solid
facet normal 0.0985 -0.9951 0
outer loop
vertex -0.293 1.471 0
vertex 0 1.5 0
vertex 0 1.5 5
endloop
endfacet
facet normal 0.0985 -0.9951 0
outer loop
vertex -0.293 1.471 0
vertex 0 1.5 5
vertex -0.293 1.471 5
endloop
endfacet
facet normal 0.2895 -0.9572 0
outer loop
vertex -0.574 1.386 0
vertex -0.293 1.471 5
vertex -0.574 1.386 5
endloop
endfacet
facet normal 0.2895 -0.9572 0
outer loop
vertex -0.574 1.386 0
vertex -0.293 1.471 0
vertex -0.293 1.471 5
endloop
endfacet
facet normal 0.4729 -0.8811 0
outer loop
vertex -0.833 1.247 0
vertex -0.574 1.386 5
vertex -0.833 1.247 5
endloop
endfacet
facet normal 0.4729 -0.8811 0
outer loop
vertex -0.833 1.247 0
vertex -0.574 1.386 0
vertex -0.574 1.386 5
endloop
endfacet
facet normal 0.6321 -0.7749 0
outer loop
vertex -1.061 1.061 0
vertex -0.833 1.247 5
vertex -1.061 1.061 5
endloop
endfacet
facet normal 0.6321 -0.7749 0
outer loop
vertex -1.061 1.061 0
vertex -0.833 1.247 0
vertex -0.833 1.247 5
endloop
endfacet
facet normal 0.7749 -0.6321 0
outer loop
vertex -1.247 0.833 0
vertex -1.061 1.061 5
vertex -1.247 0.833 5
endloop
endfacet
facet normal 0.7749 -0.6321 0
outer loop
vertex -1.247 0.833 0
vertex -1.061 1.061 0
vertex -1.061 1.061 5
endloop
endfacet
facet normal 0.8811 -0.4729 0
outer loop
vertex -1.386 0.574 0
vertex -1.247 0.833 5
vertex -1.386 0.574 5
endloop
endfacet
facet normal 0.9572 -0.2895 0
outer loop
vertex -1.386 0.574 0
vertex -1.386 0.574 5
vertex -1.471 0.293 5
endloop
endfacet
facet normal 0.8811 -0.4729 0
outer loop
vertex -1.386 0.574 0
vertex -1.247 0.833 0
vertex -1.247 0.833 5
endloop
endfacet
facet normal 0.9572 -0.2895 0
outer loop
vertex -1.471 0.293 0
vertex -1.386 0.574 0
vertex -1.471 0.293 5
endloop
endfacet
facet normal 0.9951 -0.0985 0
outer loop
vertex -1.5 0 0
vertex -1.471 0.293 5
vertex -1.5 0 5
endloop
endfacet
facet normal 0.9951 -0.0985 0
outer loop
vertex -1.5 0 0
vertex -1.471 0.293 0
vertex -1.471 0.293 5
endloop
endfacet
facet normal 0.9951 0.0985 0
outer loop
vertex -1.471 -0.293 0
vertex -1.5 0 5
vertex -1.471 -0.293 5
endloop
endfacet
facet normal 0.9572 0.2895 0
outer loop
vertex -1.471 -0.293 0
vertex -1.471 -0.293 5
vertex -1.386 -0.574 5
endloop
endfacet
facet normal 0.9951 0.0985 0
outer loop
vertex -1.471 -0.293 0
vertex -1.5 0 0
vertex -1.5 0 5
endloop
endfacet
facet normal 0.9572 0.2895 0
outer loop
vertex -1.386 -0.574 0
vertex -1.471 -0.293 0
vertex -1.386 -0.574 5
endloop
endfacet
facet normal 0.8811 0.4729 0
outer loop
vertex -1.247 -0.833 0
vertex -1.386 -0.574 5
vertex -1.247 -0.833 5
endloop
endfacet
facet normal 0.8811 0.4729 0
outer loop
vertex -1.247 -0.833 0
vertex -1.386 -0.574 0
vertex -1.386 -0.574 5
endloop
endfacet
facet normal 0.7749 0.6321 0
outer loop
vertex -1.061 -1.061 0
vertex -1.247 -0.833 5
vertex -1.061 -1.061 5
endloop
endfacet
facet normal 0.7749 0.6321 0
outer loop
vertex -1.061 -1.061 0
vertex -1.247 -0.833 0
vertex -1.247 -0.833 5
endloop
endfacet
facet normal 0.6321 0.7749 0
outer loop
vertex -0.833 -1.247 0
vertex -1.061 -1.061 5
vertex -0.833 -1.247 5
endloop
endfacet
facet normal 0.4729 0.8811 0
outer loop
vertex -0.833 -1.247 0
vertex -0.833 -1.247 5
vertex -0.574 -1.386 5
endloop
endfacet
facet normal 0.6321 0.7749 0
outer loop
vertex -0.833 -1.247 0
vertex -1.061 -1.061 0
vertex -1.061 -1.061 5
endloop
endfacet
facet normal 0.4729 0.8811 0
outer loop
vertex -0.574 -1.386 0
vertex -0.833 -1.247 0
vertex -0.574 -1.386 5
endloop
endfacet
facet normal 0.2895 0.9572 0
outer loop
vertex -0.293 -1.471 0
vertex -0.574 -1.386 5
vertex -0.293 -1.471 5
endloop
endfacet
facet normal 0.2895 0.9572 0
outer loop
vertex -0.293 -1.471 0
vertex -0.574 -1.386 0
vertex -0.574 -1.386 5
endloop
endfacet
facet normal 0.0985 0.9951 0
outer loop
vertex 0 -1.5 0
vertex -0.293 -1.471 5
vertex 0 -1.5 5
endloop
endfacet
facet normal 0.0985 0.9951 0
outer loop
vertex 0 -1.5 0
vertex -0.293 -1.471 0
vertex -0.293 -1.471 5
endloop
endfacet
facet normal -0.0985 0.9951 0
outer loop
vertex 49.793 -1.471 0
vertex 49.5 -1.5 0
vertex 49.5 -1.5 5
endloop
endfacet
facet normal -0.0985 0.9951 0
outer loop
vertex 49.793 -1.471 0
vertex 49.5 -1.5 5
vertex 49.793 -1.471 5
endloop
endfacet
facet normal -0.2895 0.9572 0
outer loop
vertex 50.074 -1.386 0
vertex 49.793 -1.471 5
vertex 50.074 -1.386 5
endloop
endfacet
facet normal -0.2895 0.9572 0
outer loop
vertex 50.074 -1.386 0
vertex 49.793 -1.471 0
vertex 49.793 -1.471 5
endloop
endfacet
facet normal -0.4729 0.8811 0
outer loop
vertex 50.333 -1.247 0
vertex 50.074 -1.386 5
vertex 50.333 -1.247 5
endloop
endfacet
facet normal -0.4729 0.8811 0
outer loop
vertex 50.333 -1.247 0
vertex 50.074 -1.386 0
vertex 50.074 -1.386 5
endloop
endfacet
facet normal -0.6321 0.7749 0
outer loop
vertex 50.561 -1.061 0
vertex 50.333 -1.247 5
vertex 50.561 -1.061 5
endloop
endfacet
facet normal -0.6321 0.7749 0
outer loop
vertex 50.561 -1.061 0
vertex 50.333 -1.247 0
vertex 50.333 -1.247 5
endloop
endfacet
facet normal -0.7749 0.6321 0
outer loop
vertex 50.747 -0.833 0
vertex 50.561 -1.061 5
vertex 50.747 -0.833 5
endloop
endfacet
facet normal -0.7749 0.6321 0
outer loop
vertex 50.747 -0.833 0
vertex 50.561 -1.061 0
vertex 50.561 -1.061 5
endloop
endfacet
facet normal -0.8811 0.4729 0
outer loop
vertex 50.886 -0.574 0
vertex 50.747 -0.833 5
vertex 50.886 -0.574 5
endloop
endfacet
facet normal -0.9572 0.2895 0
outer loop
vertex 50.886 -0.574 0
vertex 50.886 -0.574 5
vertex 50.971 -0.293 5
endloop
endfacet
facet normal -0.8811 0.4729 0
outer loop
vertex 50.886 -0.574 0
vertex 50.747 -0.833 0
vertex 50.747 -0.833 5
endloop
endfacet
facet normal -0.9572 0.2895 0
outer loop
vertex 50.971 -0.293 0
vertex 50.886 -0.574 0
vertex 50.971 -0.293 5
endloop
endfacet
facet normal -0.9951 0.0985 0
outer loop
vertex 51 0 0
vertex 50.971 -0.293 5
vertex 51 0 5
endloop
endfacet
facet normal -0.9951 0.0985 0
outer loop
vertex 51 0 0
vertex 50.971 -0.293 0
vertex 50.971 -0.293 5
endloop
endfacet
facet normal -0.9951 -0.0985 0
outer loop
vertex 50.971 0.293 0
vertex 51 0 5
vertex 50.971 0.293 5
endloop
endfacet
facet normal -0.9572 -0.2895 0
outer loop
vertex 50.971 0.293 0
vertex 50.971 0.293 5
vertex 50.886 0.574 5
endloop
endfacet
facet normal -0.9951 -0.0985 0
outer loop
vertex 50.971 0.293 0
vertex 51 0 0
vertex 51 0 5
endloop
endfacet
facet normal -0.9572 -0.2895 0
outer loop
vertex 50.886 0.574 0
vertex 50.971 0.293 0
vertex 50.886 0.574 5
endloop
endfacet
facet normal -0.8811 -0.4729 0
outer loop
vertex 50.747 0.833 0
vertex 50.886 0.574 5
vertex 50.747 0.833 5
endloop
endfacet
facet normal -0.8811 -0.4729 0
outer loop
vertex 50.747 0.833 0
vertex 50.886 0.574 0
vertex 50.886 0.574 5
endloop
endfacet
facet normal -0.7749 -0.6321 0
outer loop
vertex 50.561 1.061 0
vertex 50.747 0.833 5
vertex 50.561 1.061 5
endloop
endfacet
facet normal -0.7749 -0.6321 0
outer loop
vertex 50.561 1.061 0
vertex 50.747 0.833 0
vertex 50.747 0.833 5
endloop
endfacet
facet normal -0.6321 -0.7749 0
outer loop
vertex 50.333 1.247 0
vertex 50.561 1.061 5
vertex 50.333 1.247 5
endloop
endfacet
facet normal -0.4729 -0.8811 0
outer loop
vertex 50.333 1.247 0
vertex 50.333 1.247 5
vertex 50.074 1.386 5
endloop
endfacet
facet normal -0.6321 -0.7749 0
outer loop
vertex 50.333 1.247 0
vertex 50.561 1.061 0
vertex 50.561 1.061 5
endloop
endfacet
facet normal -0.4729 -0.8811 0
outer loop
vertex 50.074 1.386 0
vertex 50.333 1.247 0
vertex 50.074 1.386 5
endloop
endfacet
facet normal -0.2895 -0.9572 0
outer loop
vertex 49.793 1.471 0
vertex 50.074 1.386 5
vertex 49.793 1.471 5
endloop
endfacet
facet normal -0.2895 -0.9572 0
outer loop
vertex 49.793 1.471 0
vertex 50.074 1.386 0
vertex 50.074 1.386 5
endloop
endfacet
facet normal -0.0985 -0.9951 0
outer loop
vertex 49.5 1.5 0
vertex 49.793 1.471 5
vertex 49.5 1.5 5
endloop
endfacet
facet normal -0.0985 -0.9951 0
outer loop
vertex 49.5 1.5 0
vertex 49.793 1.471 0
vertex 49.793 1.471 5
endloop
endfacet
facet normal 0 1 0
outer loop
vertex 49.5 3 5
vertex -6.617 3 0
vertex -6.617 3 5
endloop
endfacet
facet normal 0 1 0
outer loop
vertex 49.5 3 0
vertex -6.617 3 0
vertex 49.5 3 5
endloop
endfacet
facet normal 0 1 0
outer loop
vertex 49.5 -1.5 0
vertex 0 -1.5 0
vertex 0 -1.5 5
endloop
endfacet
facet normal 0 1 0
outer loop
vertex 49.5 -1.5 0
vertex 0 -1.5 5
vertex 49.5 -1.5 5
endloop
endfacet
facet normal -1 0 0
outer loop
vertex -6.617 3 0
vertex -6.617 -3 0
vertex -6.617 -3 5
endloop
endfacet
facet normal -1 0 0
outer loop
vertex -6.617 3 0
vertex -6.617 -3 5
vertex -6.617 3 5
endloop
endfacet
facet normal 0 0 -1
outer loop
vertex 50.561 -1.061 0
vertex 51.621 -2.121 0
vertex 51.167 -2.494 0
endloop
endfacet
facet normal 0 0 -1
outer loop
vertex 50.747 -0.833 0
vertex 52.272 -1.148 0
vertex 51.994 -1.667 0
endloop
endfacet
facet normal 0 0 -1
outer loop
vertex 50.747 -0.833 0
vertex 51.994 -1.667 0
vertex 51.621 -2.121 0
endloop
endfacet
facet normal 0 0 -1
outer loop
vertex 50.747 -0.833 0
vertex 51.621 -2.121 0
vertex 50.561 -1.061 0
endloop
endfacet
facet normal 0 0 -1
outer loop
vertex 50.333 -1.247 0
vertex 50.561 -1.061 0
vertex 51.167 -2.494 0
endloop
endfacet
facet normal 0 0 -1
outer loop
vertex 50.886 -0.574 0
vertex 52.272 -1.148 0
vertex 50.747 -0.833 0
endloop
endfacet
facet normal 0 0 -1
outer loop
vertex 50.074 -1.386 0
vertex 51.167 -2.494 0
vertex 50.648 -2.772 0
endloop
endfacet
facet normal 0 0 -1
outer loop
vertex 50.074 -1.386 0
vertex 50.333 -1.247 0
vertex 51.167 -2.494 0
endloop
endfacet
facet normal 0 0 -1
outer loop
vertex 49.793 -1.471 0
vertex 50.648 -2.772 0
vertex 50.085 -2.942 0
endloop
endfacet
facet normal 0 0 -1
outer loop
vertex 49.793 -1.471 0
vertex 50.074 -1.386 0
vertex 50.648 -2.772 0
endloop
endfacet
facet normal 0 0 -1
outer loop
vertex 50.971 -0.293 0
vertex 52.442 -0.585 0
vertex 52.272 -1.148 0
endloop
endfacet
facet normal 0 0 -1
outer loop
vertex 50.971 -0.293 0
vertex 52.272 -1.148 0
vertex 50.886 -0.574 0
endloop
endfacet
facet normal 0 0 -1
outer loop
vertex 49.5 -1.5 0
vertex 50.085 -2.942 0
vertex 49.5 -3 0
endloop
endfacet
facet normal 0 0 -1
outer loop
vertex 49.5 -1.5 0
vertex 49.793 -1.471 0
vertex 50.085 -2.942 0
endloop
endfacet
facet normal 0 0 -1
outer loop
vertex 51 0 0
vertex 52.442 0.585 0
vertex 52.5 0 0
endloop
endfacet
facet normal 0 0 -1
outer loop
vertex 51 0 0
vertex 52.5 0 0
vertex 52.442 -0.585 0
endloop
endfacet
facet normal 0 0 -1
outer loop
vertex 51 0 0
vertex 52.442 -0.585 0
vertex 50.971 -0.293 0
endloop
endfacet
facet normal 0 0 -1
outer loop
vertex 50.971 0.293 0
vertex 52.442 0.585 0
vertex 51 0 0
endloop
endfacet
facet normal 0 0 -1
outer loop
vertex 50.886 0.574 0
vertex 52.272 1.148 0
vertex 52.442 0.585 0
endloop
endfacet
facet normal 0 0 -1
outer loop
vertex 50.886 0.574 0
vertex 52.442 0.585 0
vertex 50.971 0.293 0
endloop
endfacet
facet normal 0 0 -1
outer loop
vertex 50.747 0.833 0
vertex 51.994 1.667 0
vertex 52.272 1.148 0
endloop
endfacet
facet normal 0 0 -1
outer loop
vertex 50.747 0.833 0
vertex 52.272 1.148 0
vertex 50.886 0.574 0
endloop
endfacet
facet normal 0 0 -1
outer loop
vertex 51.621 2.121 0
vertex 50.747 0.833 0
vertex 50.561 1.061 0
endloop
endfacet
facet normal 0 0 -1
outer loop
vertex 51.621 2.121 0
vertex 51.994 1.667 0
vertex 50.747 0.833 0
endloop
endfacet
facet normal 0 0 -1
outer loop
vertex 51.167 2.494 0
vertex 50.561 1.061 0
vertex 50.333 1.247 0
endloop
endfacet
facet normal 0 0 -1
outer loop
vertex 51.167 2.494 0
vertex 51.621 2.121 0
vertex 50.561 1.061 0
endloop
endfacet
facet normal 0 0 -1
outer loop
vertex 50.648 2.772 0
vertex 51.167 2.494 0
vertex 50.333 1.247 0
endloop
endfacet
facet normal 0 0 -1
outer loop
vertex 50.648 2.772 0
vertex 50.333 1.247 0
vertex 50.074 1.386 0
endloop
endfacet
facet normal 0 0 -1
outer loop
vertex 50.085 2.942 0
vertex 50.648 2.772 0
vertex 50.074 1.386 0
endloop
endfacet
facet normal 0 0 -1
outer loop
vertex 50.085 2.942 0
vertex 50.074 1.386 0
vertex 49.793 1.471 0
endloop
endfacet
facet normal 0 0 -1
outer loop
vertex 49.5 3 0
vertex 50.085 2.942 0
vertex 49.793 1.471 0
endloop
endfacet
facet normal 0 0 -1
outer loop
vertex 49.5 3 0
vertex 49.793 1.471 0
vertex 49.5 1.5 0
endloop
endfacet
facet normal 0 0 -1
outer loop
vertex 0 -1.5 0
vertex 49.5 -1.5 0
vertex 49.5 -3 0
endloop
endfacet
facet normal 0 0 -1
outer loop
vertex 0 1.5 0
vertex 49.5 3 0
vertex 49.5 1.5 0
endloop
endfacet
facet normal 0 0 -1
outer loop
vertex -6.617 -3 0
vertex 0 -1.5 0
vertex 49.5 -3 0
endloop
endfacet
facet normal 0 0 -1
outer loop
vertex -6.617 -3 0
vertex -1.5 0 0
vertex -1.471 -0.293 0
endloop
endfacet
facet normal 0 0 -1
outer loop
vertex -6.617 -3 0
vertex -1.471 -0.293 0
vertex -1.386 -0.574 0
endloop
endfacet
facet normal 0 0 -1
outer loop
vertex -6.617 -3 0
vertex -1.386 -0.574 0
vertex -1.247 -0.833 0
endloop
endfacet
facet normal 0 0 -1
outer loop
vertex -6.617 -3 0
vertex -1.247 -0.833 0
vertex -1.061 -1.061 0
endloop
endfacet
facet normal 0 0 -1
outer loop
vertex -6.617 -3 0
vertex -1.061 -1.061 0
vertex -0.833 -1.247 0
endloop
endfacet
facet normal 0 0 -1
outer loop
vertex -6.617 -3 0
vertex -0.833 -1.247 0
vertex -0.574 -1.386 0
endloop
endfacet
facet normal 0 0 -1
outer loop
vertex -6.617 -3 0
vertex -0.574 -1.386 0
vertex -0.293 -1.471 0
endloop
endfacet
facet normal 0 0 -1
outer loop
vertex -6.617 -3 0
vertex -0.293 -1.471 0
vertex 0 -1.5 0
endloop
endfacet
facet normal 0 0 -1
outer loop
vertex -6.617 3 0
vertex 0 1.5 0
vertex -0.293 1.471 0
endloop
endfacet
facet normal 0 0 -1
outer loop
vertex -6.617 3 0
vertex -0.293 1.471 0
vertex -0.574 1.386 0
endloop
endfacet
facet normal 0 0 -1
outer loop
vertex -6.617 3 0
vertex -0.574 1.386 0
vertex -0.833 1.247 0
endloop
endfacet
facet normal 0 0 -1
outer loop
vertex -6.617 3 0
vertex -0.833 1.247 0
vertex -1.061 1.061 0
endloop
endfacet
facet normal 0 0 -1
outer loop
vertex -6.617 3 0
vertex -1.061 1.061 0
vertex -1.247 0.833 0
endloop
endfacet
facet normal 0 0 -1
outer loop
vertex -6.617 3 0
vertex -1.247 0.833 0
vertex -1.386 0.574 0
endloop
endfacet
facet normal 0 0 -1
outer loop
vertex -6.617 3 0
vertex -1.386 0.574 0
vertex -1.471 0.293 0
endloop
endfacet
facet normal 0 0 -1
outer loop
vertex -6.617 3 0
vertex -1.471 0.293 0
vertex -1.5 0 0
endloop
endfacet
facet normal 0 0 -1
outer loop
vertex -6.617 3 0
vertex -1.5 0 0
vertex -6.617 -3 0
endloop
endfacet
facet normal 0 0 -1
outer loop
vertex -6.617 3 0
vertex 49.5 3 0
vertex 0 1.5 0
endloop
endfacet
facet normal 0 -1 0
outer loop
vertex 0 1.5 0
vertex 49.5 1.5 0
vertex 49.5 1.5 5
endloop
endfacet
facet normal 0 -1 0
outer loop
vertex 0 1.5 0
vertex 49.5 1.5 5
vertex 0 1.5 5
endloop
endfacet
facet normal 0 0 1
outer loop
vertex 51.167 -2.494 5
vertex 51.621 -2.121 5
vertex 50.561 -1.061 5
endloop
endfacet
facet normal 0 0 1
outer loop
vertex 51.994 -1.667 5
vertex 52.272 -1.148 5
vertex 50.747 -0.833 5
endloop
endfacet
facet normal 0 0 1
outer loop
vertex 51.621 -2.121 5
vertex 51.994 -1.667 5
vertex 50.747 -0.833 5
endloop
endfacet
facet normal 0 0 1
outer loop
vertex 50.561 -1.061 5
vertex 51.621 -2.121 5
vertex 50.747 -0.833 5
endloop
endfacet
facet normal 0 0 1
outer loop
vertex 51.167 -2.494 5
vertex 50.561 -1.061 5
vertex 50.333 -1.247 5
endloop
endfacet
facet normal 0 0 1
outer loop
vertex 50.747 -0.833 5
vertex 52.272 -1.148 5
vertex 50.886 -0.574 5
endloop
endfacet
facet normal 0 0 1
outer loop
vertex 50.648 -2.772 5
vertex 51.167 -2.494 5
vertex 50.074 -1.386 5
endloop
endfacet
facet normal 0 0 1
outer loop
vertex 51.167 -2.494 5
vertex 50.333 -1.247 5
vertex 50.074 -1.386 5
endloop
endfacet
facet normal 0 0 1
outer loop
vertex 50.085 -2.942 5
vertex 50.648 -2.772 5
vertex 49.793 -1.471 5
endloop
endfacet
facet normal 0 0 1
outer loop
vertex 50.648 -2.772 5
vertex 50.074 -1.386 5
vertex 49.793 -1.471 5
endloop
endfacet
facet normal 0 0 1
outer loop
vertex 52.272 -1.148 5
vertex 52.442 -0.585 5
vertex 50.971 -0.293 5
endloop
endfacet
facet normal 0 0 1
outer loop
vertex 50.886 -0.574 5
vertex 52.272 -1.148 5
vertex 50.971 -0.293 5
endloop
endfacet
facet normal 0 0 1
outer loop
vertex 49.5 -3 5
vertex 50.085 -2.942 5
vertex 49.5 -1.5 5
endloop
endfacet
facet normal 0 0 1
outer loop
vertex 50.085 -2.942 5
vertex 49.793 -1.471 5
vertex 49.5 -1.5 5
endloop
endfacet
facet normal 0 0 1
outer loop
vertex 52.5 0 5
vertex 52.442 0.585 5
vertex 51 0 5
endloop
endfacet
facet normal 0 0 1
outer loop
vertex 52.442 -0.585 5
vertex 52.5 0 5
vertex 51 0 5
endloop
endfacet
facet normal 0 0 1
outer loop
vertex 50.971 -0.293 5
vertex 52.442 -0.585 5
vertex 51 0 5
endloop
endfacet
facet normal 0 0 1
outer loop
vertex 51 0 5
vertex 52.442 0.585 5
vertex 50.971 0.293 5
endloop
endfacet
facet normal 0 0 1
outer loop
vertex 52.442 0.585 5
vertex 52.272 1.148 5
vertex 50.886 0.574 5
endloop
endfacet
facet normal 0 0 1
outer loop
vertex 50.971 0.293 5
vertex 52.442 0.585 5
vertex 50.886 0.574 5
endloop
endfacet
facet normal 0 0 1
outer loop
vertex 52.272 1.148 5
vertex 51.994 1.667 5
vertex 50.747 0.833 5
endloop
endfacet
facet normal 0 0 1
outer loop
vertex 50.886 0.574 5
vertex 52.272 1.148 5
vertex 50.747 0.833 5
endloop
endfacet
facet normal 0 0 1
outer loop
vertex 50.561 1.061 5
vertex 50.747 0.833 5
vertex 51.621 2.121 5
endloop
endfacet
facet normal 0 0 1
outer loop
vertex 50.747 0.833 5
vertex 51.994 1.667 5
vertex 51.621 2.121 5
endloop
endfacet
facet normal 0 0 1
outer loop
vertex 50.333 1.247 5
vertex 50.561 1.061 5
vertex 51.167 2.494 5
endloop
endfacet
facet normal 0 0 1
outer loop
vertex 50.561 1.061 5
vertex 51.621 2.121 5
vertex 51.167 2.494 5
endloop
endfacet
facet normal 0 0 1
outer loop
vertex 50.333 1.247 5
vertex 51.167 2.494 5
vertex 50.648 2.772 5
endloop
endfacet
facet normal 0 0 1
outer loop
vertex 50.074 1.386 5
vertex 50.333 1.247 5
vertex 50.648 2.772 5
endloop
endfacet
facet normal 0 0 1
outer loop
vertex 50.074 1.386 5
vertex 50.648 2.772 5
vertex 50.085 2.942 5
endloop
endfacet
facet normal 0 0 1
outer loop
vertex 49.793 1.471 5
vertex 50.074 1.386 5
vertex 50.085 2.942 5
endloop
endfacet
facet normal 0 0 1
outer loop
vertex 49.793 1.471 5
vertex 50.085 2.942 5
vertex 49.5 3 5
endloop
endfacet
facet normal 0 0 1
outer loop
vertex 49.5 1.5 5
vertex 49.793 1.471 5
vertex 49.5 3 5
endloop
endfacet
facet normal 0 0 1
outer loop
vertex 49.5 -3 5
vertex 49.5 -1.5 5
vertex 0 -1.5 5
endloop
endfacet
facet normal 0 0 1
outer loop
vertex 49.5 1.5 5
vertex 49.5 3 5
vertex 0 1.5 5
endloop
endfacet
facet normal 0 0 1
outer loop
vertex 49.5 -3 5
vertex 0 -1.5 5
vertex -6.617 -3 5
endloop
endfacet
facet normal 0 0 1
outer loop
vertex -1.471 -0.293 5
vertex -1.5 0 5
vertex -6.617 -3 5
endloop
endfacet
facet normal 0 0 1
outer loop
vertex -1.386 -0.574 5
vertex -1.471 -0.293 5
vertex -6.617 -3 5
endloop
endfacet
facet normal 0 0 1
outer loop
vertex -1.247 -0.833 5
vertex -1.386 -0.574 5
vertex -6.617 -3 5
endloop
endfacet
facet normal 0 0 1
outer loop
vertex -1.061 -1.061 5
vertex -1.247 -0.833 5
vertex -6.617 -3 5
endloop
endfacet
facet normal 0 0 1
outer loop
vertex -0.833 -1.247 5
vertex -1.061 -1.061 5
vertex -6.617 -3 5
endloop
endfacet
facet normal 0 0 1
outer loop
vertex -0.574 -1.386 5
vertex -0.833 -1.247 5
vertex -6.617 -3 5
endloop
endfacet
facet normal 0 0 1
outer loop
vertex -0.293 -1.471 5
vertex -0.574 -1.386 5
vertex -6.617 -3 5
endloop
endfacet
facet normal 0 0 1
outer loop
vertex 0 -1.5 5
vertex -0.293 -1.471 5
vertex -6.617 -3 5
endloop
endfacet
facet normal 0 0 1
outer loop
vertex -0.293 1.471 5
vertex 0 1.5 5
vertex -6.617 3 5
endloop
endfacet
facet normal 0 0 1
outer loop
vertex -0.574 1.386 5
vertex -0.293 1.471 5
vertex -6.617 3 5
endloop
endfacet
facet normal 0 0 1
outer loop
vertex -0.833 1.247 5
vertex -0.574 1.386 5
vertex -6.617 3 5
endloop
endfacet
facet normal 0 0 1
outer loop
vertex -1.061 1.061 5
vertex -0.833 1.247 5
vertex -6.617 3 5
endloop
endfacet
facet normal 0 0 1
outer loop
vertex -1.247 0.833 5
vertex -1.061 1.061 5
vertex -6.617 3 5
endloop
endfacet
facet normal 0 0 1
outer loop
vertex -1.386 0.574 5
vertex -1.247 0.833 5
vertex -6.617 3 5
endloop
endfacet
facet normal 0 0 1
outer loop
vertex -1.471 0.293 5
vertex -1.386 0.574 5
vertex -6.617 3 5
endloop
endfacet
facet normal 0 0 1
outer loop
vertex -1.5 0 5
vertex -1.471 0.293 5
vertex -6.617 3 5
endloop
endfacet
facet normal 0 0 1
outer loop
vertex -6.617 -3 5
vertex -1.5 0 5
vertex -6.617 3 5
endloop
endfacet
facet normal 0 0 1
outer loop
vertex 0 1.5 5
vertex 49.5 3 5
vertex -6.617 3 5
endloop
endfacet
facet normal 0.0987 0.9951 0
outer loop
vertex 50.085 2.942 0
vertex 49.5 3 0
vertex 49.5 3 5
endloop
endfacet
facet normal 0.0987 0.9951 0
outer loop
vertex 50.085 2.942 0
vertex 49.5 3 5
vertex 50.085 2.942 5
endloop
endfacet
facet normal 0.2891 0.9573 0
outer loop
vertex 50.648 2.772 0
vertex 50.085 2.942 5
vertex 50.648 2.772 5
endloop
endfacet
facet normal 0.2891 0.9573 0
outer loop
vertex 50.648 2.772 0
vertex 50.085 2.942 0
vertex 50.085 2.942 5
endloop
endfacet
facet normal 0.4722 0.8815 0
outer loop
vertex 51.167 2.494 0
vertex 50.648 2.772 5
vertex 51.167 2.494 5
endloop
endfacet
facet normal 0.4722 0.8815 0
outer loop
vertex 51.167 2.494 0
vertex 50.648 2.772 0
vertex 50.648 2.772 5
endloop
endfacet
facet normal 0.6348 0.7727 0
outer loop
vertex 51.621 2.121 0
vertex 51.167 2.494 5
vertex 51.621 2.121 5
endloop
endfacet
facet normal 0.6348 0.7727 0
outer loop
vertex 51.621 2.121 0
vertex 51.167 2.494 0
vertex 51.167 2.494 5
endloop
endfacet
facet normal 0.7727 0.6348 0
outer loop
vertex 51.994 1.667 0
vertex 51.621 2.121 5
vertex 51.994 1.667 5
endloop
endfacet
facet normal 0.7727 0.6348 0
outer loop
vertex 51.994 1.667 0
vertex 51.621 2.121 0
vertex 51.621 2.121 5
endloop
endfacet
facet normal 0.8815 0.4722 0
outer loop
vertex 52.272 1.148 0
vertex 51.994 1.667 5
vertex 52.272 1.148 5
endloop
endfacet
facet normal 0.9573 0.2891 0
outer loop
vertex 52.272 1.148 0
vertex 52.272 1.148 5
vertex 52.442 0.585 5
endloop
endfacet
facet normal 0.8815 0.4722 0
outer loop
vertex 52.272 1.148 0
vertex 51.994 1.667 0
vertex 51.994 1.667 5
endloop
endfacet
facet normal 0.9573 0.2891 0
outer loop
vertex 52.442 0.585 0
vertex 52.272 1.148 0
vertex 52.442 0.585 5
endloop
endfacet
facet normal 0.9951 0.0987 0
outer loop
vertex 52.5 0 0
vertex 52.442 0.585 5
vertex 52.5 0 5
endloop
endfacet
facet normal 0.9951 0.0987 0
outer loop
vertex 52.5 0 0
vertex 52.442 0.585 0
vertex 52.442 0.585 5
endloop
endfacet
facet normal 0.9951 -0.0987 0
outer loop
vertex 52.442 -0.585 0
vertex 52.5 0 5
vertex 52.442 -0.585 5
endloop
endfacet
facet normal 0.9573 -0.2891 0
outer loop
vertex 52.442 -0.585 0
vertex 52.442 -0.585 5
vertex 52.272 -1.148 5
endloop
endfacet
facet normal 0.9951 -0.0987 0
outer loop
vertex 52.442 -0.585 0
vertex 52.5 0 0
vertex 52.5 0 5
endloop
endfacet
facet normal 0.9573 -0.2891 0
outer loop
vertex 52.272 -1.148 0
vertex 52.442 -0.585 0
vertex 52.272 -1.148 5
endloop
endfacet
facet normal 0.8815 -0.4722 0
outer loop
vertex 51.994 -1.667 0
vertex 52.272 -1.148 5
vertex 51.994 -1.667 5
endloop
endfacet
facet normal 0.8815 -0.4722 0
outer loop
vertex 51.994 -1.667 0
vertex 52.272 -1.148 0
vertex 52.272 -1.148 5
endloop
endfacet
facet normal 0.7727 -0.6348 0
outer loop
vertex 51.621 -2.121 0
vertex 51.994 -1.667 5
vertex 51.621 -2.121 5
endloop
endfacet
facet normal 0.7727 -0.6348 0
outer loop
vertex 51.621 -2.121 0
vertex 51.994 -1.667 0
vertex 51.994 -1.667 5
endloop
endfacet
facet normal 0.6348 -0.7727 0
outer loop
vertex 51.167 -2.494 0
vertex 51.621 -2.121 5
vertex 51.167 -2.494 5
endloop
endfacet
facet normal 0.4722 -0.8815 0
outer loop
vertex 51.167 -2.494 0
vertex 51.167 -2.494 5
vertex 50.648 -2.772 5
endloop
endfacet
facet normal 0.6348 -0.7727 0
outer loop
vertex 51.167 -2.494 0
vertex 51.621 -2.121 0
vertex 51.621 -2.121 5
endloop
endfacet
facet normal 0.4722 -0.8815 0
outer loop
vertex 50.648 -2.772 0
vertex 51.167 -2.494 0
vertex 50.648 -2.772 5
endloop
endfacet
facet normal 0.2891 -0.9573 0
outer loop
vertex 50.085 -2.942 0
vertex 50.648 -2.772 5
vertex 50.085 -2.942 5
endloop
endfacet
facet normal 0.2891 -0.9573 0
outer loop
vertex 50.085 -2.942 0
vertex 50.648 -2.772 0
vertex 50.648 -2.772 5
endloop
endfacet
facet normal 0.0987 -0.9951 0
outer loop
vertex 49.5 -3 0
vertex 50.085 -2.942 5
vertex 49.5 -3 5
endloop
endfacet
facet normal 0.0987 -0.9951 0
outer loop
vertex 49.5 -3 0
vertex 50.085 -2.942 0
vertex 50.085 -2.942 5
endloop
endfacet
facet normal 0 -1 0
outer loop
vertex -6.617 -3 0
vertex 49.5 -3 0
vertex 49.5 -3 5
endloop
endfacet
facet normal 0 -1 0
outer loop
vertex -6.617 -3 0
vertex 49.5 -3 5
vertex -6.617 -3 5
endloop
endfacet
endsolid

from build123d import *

# Parameters (mm, degrees)
BOSS_EXTRUDE1_DEPTH = 5


with BuildPart() as part:
    # Sketch2 → Boss-Extrude1 (new body)
    with BuildSketch(Plane.XY):
        with BuildLine():
            Line((0, 3), (49.5, 3))
            ThreePointArc((49.5, 3), (52.5, 0), (49.5, -3))
            Line((49.5, -3), (3, -3))
            Line((3, -3), (-6.616826065, -3))
            Line((-6.616826065, -3), (-6.616826065, 3))
            Line((-6.616826065, 3), (0, 3))
        make_face()
        with BuildLine():
            Line((0, -1.5), (49.5, -1.5))
            ThreePointArc((49.5, -1.5), (51, 0), (49.5, 1.5))
            Line((49.5, 1.5), (0, 1.5))
            ThreePointArc((0, 1.5), (-1.5, 0), (0, -1.5))
        make_face(mode=Mode.SUBTRACT)
    extrude(amount=BOSS_EXTRUDE1_DEPTH)


solid = part.part
